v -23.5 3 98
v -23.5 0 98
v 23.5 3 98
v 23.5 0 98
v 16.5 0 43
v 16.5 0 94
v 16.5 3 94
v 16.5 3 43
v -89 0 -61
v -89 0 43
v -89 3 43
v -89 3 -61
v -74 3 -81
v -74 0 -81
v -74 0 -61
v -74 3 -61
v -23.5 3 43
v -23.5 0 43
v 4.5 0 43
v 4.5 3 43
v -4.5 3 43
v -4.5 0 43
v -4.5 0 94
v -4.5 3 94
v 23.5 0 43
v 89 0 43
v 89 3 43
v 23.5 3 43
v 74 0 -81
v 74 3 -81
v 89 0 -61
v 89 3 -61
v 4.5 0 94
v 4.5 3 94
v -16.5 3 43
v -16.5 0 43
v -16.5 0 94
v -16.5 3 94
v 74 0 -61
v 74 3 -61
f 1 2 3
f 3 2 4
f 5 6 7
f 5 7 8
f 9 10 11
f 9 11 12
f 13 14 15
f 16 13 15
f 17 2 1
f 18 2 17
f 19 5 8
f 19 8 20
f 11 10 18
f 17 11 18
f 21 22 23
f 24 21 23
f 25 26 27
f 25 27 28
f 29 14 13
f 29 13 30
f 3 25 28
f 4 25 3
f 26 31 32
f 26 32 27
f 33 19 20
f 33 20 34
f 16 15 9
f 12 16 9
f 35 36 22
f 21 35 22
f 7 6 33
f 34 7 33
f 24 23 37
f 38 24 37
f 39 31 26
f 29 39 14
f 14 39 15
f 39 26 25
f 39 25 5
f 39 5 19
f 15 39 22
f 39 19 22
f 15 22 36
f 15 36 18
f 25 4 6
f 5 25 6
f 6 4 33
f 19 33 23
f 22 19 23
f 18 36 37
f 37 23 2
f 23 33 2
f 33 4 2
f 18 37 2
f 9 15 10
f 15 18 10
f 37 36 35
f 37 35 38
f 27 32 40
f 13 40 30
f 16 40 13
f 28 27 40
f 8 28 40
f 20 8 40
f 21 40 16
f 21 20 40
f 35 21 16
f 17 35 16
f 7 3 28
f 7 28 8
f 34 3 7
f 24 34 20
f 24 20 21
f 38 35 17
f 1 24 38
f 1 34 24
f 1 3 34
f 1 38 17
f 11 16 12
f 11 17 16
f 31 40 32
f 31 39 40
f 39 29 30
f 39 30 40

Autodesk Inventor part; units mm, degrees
ref_plane "YZ Plane" through (0, 0, 0) normal (1, 0, 0) x (0, 1, 0)
ref_plane "XZ Plane" through (0, 0, 0) normal (0, 1, 0) x (-1, 0, 0)
ref_plane "XY Plane" through (0, 0, 0) normal (0, 0, 1) x (1, 0, 0)
sketch "Sketch2" plane through (0, 0, 0) normal (0, 1, 0) x (-1, 0, 0)
  line L0 (-89, 99) -> (89, 99)
  line L1 (89, 99) -> (89, -99)
  line L2 (89, -99) -> (-89, -99)
  line L3 (-89, -99) -> (-89, 99)
  line L4 (-89, 99) -> (89, -99) construction
  line L5 (89, 99) -> (-89, -99) construction
  line L6 (-89, 99) -> (89, 99)
  line L7 (89, 99) -> (89, -81)
  line L8 (89, -81) -> (-89, -81)
  line L9 (-89, -81) -> (-89, 99)
  line L10 (-4.5, 99) -> (-89, 99)
  line L11 (-89, 99) -> (-89, 43)
  line L12 (-89, 43) -> (-4.5, 43)
  line L13 (-4.5, 43) -> (-4.5, 99)
  line L14 (4.5, 99) -> (89, 99)
  line L15 (89, 99) -> (89, 43)
  line L16 (89, 43) -> (4.5, 43)
  line L17 (4.5, 43) -> (4.5, 99)
  line L18 (22.5, 77.5) -> (22.5, 66.5) projected
  line L19 (16.5, 66.5) -> (16.5, 77.5) projected
  line L20 (-22.5, 66.5) -> (-22.5, 77.5) projected
  line L21 (-16.5, 77.5) -> (-16.5, 66.5) projected
  line L22 (-23.5, 99) -> (-16.5, 99)
  line L23 (-16.5, 99) -> (-16.5, 43)
  line L24 (-16.5, 43) -> (-23.5, 43)
  line L25 (-23.5, 43) -> (-23.5, 99)
  line L26 (16.5, 99) -> (23.5, 99)
  line L27 (23.5, 99) -> (23.5, 43)
  line L28 (23.5, 43) -> (16.5, 43)
  line L29 (16.5, 43) -> (16.5, 99)
  line L30 (-89, 99) -> (89, 99)
  line L31 (89, 99) -> (89, 98)
  line L32 (89, 98) -> (-89, 98)
  line L33 (-89, 98) -> (-89, 99)
  line L34 (89, -81) -> (74, -81)
  line L35 (74, -81) -> (74, -61)
  line L36 (74, -61) -> (89, -61)
  line L37 (89, -61) -> (89, -81)
  line L38 (-89, -81) -> (-74, -81)
  line L39 (-74, -81) -> (-74, -61)
  line L40 (-74, -61) -> (-89, -61)
  line L41 (-89, -61) -> (-89, -81)
  line L42 (16.5, 98) -> (-16.5, 98)
  line L43 (-16.5, 98) -> (-16.5, 94)
  line L44 (-16.5, 94) -> (16.5, 94)
  line L45 (16.5, 94) -> (16.5, 98)
  line L46 (-84.4, -75) -> (-84.4, -71.5) projected
  line L47 (-84.4, -71.5) -> (-87, -71.5) projected
  line L48 (-87, -71.5) -> (-87, -75) projected
  line L49 (-87, -75) -> (-84.4, -75) projected
  line L50 (-79.6, -75) -> (-77, -75) projected
  line L51 (-77, -75) -> (-77, -71.5) projected
  line L52 (-77, -71.5) -> (-79.6, -71.5) projected
  line L53 (-79.6, -71.5) -> (-79.6, -75) projected
  line L54 (-75, -78) -> (-89, -78) projected
  line L55 (-89, -78) -> (-89, -63) projected
  line L56 (-89, -63) -> (-75, -63) projected
  line L57 (-75, -63) -> (-75, -78) projected
  circle A0 centre (-80.45, -67.25) radius 1.25 projected
  point P0 (0, 0)
  point P1 (4.5, 99)
  point P2 (-4.5, 99)
  point P3 (-89, 43)
  point P4 (89, 43)
  point P5 (4.5, 98)
  point P6 (-4.5, 98)
  point P7 (-16.5, 98)
  point P8 (-23.5, 98)
  point P9 (23.5, 98)
  point P10 (16.5, 98)
  point P11 (-4.5, 94)
  point P12 (4.5, 94)
  point P13 (16.5, 94)
  dimension "d8" = 178
  dimension "d9" = 198
  dimension "d10" = 18
  dimension "d11" = 84.5
  dimension "d13" = 84.5
  dimension "d17" = 9
  dimension "d18" = 1
  dimension "d19" = 15
  dimension "d20" = 20
  dimension "d21" = 15
  dimension "d22" = 20
  dimension "d75" = 55
  dimension "d76" = 55
  dimension "d77" = 7
  dimension "d78" = 7
  dimension "d79" = 4
extrude "Extrusion2" add sketch "Sketch2" along normal blind 3 contours L32 L23 L21 L12 L25 | L12 L13 L44 L17 L16 L1 L36 L35 L8 L39 L40 L3 | L32 L13 L44 L23 | L32 L17 L44 L13 | L32 L29 L44 L17 | L32 L27 L16 L29 L19
equation "\"d11\" = d13"
properties part number "base" material "Aluminum 6061"
